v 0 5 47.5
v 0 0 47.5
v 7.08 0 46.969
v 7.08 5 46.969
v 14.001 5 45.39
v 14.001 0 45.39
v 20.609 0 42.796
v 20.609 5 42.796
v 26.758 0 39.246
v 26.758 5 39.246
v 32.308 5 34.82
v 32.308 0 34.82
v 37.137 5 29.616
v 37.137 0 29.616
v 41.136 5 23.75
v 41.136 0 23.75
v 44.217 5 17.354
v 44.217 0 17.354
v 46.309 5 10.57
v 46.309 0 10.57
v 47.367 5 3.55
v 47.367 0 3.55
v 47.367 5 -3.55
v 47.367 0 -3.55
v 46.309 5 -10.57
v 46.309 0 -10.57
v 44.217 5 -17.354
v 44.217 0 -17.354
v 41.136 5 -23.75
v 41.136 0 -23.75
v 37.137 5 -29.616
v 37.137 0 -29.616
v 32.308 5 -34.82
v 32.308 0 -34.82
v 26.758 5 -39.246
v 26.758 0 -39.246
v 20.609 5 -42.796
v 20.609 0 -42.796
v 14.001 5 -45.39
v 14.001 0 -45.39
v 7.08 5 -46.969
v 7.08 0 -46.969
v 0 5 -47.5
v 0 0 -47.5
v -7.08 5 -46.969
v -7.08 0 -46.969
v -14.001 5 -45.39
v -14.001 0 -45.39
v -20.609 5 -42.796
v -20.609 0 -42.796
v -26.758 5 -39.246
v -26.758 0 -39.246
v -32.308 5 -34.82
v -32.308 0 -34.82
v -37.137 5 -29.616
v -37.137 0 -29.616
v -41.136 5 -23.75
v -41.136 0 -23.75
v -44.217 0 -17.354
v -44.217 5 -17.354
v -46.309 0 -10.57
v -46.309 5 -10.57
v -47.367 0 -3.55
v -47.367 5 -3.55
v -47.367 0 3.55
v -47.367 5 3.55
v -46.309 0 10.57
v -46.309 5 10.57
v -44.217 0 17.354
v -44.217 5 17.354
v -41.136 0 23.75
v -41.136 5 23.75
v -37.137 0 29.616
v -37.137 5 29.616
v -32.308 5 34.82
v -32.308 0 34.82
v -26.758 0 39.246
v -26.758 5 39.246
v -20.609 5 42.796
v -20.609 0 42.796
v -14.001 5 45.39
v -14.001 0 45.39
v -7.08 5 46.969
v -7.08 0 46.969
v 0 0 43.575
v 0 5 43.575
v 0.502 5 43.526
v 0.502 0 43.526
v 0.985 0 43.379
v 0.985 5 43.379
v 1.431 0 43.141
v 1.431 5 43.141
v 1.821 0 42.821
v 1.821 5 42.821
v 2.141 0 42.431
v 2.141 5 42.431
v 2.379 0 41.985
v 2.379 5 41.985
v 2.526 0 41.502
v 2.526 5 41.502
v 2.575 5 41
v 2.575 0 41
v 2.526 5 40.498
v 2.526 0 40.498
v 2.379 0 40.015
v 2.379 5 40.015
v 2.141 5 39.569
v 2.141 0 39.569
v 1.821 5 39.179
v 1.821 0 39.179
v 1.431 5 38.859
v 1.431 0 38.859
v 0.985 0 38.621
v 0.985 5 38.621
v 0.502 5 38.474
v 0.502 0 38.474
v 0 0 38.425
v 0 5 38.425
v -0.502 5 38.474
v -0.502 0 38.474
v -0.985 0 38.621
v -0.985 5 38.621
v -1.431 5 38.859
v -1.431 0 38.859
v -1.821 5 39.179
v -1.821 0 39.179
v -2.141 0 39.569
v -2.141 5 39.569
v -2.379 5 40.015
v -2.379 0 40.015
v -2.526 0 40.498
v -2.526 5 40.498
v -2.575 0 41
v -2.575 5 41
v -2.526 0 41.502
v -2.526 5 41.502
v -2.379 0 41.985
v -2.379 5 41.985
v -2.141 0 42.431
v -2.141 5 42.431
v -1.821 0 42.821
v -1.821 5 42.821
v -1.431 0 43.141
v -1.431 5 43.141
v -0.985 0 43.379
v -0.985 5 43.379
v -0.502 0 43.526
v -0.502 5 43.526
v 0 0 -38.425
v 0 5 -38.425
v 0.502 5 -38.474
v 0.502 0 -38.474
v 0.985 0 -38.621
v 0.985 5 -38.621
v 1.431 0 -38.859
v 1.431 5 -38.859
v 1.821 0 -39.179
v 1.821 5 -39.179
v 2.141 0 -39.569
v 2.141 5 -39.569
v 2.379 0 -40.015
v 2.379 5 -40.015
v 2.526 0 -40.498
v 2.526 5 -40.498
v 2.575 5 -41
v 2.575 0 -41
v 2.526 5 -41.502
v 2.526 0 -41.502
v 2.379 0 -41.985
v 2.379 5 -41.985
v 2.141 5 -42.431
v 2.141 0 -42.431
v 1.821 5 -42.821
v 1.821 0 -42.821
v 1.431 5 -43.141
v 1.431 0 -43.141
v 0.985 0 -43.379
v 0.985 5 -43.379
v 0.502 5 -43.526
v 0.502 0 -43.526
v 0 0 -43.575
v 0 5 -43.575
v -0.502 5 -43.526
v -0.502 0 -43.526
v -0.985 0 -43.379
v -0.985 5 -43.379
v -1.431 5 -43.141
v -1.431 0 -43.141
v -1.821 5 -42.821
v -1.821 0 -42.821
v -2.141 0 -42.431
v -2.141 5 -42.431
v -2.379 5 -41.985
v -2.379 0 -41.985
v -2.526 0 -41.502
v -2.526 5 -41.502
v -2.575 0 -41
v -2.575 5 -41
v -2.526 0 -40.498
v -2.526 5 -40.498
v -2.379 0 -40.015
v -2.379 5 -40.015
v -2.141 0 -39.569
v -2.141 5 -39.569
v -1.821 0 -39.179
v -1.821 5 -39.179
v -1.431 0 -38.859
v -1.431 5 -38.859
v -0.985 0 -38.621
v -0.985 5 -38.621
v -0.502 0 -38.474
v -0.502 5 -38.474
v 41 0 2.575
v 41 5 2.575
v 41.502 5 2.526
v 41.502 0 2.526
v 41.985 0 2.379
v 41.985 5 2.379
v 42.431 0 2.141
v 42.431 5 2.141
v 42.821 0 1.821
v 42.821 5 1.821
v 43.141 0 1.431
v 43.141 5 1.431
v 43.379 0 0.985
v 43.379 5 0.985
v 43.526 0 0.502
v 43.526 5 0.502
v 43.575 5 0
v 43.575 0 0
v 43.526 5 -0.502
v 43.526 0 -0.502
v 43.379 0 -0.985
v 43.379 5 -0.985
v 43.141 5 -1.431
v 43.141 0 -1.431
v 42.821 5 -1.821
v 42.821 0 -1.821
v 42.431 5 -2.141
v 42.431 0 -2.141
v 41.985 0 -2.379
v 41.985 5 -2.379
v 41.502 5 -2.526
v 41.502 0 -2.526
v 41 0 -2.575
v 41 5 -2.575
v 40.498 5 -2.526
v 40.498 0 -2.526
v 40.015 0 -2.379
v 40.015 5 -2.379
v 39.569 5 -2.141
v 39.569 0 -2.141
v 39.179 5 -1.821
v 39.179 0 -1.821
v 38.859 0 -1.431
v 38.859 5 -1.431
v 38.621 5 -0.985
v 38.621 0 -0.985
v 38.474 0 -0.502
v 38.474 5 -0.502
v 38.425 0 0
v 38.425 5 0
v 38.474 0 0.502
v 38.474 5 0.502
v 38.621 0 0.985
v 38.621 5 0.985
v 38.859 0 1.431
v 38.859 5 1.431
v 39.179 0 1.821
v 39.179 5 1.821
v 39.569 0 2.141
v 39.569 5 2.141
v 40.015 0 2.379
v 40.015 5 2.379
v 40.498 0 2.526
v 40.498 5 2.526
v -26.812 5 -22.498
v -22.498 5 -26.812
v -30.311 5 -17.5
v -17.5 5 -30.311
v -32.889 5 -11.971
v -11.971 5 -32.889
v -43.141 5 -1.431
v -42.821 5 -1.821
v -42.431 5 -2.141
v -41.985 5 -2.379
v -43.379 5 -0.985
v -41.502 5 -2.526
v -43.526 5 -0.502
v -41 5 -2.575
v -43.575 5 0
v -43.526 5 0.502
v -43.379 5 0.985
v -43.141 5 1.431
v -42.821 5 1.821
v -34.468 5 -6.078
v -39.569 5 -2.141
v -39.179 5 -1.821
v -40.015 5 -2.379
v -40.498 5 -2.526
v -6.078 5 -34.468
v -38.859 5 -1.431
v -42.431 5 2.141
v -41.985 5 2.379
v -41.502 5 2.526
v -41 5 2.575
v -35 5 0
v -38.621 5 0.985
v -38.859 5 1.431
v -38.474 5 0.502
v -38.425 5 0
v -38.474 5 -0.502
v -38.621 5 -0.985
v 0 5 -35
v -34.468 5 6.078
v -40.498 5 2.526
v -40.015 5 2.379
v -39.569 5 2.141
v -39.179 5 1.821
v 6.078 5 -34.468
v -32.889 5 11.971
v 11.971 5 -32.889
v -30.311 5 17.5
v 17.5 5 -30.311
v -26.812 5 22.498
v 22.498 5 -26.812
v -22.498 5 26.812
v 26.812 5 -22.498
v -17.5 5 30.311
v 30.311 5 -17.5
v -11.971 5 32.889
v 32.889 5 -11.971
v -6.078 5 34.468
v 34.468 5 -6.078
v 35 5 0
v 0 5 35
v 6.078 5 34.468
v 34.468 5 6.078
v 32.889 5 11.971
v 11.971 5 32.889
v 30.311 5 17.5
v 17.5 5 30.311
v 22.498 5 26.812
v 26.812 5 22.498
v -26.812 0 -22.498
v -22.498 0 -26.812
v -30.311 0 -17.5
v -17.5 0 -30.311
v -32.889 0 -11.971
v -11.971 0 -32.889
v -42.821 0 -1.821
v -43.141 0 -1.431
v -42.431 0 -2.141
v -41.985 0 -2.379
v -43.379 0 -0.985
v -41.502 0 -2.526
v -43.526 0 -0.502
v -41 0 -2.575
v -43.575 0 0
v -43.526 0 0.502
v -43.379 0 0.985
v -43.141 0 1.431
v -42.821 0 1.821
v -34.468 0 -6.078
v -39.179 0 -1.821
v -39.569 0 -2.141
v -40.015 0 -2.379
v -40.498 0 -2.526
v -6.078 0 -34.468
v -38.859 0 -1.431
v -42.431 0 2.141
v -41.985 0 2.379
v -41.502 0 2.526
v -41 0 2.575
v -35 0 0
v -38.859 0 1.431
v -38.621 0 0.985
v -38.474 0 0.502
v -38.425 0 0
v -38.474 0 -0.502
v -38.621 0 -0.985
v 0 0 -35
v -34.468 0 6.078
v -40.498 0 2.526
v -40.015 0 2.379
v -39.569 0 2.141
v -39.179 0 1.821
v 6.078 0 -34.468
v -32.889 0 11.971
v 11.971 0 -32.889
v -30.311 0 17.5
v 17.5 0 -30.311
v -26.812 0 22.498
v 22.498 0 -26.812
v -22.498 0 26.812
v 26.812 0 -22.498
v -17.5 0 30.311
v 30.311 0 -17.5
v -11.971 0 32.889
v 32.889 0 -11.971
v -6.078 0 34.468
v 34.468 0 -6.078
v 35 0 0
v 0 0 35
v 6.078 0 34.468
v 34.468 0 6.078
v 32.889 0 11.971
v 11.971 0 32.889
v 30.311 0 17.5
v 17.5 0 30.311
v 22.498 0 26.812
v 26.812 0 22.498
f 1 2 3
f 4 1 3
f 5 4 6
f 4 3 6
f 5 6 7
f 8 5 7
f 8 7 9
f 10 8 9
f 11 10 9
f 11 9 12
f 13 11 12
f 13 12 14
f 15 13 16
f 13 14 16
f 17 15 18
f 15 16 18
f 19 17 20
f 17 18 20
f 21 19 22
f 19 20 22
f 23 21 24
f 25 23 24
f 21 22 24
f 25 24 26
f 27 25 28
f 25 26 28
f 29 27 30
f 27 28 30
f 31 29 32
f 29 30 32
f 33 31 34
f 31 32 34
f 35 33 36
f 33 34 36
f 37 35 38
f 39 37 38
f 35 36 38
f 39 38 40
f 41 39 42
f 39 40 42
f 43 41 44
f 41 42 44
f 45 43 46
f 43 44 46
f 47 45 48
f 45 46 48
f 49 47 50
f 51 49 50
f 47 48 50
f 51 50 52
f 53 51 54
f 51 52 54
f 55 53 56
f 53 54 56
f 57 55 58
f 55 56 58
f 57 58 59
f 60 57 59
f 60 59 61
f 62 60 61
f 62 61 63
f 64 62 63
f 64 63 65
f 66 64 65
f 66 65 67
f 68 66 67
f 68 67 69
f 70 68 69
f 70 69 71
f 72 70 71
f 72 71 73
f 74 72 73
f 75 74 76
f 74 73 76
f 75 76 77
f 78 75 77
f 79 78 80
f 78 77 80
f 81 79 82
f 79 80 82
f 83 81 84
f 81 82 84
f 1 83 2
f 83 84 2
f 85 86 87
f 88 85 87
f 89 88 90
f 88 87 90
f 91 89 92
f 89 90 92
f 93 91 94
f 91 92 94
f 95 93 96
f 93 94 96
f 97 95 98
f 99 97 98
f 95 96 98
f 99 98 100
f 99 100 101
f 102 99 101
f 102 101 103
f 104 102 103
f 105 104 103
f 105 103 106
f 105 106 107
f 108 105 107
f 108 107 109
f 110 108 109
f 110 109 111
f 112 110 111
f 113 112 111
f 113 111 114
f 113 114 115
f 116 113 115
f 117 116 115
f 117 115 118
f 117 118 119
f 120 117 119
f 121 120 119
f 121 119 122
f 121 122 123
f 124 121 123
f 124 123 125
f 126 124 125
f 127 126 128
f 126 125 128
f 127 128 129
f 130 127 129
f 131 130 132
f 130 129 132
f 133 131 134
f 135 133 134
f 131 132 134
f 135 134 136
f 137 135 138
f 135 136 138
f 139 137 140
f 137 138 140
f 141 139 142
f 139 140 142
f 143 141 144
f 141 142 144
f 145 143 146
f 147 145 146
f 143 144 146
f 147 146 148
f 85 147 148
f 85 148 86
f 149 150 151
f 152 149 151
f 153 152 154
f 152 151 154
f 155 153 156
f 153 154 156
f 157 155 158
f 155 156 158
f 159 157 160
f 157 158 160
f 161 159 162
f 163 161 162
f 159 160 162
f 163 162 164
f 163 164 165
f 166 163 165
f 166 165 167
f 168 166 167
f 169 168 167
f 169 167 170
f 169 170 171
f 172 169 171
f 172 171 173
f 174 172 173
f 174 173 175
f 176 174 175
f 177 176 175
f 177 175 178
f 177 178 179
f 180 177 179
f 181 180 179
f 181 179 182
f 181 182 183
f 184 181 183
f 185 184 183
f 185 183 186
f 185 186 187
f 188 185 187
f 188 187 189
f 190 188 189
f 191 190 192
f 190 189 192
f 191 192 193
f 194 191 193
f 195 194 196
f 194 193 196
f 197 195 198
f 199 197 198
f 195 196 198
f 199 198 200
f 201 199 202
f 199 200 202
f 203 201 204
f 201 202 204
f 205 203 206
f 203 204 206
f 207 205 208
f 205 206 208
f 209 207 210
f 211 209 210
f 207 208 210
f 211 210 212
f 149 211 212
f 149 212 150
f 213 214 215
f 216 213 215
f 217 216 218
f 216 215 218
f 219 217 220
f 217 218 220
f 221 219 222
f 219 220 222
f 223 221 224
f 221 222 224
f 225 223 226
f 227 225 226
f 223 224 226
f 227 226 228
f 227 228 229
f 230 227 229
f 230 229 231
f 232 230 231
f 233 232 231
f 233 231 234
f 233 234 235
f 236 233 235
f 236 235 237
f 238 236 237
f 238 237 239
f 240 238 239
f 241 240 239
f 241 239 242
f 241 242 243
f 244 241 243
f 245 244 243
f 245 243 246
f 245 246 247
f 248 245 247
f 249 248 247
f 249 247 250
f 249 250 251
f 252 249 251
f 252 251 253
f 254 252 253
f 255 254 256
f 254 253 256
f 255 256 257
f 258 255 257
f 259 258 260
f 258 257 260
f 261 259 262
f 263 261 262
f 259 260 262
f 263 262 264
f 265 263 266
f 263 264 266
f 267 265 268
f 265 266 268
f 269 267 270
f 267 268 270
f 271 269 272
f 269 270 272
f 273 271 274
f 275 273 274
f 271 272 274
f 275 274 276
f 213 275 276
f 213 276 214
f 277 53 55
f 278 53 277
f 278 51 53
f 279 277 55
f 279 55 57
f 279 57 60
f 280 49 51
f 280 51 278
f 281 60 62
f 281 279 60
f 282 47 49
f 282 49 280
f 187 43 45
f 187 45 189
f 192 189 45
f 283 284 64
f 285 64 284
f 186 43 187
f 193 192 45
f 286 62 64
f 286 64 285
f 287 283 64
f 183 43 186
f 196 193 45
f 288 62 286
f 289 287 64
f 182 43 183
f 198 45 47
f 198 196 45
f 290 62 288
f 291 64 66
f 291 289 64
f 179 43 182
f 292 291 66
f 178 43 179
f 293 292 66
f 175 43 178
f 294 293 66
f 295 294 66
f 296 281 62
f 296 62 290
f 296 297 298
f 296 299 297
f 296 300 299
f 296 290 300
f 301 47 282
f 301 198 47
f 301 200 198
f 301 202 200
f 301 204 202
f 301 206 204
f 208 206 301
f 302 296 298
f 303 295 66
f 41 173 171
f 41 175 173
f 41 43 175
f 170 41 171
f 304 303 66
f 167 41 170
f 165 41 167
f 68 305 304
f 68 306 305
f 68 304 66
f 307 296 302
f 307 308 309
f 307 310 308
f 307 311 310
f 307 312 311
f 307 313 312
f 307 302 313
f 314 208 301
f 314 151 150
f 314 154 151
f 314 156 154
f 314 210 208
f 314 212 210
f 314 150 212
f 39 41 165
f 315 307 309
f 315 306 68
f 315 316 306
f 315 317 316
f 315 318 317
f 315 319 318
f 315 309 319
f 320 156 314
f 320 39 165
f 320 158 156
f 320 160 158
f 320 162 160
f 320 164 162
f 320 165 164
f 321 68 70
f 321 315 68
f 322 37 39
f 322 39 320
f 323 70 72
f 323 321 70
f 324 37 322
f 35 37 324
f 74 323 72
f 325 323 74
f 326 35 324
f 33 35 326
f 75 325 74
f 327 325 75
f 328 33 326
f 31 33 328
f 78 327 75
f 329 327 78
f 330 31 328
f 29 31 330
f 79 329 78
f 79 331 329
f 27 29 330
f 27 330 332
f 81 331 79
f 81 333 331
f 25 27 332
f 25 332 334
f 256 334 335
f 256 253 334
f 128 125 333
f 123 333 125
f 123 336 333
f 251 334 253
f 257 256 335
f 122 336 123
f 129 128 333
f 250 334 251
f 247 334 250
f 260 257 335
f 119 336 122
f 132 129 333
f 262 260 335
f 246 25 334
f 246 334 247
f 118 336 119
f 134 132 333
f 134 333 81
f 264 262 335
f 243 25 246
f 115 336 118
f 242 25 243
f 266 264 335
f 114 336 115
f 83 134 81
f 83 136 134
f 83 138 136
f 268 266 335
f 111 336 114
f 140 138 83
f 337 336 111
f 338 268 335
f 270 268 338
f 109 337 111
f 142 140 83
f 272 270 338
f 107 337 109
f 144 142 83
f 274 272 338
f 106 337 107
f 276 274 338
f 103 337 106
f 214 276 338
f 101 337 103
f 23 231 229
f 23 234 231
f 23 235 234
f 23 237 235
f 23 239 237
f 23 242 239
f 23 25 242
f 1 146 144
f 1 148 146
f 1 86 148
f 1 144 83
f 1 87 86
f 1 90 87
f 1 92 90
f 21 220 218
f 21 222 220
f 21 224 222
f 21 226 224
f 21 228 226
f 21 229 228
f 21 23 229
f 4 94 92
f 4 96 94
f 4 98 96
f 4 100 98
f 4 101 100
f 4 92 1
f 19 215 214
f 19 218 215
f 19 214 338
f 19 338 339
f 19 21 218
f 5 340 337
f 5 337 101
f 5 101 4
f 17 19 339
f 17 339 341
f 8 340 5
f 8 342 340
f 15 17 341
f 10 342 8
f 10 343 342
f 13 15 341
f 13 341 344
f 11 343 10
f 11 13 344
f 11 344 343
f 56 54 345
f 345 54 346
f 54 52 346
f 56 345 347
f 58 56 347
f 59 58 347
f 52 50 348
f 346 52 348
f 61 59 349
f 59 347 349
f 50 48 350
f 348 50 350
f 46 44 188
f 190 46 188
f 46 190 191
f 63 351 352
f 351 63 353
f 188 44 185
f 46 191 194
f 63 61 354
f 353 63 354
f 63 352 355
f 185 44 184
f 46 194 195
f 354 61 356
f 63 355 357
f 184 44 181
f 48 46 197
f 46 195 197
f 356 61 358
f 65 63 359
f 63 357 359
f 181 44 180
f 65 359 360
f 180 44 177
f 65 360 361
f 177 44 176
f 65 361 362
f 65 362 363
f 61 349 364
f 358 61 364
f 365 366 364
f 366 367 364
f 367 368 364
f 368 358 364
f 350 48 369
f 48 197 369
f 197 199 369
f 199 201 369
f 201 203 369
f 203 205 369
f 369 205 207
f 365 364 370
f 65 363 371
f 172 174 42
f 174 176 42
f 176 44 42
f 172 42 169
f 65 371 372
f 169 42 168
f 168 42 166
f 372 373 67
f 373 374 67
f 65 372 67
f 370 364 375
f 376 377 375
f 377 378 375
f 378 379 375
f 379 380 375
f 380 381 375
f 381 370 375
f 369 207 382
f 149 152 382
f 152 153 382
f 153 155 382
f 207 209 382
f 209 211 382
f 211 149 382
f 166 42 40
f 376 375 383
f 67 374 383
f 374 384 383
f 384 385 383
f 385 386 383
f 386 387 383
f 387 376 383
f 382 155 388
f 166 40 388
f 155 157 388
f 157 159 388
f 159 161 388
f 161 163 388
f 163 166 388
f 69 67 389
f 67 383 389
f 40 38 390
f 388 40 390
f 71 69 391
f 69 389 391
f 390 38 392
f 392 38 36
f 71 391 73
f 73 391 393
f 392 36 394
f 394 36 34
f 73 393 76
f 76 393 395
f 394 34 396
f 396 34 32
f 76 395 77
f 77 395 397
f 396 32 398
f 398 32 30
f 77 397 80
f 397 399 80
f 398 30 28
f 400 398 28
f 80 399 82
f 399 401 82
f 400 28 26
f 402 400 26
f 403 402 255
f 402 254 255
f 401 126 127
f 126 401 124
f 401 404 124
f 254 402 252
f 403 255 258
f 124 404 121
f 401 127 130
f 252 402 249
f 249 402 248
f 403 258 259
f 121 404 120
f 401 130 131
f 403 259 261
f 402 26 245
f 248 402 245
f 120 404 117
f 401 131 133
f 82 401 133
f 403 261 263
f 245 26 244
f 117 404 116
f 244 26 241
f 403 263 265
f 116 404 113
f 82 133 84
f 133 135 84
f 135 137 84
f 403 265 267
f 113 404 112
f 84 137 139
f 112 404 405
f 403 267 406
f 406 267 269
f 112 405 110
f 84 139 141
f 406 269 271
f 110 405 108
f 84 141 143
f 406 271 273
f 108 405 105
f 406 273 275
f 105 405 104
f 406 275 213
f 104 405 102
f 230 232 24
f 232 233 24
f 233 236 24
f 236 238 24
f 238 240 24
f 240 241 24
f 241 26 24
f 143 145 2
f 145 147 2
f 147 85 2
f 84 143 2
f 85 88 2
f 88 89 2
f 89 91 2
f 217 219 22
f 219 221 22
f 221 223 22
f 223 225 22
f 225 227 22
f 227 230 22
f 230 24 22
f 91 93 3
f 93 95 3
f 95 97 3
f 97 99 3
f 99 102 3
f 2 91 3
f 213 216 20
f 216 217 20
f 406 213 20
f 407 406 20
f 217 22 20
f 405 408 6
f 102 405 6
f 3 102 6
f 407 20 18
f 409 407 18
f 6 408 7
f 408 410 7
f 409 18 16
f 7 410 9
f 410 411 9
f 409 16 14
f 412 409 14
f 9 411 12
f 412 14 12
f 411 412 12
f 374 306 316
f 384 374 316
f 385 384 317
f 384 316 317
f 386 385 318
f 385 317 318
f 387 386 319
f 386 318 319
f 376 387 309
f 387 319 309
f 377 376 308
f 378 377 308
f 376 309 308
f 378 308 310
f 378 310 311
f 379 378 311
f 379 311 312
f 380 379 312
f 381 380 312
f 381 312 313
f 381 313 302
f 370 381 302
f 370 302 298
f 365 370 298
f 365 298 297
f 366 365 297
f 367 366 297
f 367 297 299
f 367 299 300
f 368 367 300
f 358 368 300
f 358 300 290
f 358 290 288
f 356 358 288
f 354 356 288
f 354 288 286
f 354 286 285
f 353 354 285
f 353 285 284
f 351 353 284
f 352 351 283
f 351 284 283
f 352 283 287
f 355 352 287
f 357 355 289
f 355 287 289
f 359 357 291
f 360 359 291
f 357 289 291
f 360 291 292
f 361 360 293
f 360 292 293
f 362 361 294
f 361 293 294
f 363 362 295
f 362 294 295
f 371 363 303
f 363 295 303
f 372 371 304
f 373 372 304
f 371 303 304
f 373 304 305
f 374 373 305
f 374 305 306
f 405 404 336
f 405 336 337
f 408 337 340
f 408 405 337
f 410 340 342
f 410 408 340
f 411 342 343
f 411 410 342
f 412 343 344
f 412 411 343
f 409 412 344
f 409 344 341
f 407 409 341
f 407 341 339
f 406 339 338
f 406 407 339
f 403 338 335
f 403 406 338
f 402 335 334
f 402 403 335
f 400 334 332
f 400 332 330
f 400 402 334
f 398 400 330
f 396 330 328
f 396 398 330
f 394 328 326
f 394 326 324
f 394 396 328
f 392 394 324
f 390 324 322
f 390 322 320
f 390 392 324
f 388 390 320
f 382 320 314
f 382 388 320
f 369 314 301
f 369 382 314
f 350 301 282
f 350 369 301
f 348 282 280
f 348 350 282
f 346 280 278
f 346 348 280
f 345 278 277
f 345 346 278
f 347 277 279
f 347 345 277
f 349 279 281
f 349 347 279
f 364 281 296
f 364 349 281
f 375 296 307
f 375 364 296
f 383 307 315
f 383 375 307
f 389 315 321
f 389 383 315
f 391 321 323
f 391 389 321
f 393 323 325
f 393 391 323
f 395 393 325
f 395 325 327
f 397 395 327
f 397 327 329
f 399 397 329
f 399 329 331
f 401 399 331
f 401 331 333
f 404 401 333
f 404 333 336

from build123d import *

# Parameters (mm, degrees)
SKETCH_1_R          = 47.5
SKETCH_1_R_2        = 35
EXTRUDE_1_DEPTH     = 5
CUT_EXTRUDE_1_REACH = 69.361
SKETCH_2_R          = 2.575


with BuildPart() as part:
    # 草图1 → 凸台-拉伸1 (new body)
    with BuildSketch(Plane(origin=(0, 0, 0), x_dir=(1, 0, 0), z_dir=(0, 1, 0))):
        with Locations(Location((0, 0, 0), (0, 0, 270))):
            Circle(SKETCH_1_R)
        with Locations(Location((0, 0, 0), (0, 0, 270))):
            Circle(SKETCH_1_R_2, mode=Mode.SUBTRACT)
    extrude(amount=EXTRUDE_1_DEPTH)

    # 草图2 → 切除-拉伸1 (cut, up to next)
    with BuildSketch(Plane(origin=(0, 5, 0), x_dir=(1, 0, 0), z_dir=(0, 1, 0)), mode=Mode.PRIVATE) as cut_extrude_1_sk1:
        with Locations(Location((0, 41, 0), (0, 0, 270))):
            Circle(SKETCH_2_R)
    cut_extrude_1_tool1 = extrude(cut_extrude_1_sk1.sketch, amount=-CUT_EXTRUDE_1_REACH, mode=Mode.PRIVATE) & part.part
    # 草图2 → 切除-拉伸1 (cut, up to next)
    with BuildSketch(Plane(origin=(0, 5, 0), x_dir=(1, 0, 0), z_dir=(0, 1, 0)), mode=Mode.PRIVATE) as cut_extrude_1_sk2:
        with Locations(Location((41, 0, 0), (0, 0, 270))):
            Circle(SKETCH_2_R)
    cut_extrude_1_tool2 = extrude(cut_extrude_1_sk2.sketch, amount=-CUT_EXTRUDE_1_REACH, mode=Mode.PRIVATE) & part.part
    # 草图2 → 切除-拉伸1 (cut, up to next)
    with BuildSketch(Plane(origin=(0, 5, 0), x_dir=(1, 0, 0), z_dir=(0, 1, 0)), mode=Mode.PRIVATE) as cut_extrude_1_sk3:
        with Locations(Location((0, -41, 0), (0, 0, 270))):
            Circle(SKETCH_2_R)
    cut_extrude_1_tool3 = extrude(cut_extrude_1_sk3.sketch, amount=-CUT_EXTRUDE_1_REACH, mode=Mode.PRIVATE) & part.part
    # 草图2 → 切除-拉伸1 (cut, up to next)
    with BuildSketch(Plane(origin=(0, 5, 0), x_dir=(1, 0, 0), z_dir=(0, 1, 0)), mode=Mode.PRIVATE) as cut_extrude_1_sk4:
        with Locations(Location((-41, 0, 0), (0, 0, 270))):
            Circle(SKETCH_2_R)
    cut_extrude_1_tool4 = extrude(cut_extrude_1_sk4.sketch, amount=-CUT_EXTRUDE_1_REACH, mode=Mode.PRIVATE) & part.part
    add(cut_extrude_1_tool1.solids().sort_by_distance((0, 5, -41))[0], mode=Mode.SUBTRACT)
    add(cut_extrude_1_tool2.solids().sort_by_distance((41, 5, 0))[0], mode=Mode.SUBTRACT)
    add(cut_extrude_1_tool3.solids().sort_by_distance((0, 5, 41))[0], mode=Mode.SUBTRACT)
    add(cut_extrude_1_tool4.solids().sort_by_distance((-41, 5, 0))[0], mode=Mode.SUBTRACT)


solid = part.part
